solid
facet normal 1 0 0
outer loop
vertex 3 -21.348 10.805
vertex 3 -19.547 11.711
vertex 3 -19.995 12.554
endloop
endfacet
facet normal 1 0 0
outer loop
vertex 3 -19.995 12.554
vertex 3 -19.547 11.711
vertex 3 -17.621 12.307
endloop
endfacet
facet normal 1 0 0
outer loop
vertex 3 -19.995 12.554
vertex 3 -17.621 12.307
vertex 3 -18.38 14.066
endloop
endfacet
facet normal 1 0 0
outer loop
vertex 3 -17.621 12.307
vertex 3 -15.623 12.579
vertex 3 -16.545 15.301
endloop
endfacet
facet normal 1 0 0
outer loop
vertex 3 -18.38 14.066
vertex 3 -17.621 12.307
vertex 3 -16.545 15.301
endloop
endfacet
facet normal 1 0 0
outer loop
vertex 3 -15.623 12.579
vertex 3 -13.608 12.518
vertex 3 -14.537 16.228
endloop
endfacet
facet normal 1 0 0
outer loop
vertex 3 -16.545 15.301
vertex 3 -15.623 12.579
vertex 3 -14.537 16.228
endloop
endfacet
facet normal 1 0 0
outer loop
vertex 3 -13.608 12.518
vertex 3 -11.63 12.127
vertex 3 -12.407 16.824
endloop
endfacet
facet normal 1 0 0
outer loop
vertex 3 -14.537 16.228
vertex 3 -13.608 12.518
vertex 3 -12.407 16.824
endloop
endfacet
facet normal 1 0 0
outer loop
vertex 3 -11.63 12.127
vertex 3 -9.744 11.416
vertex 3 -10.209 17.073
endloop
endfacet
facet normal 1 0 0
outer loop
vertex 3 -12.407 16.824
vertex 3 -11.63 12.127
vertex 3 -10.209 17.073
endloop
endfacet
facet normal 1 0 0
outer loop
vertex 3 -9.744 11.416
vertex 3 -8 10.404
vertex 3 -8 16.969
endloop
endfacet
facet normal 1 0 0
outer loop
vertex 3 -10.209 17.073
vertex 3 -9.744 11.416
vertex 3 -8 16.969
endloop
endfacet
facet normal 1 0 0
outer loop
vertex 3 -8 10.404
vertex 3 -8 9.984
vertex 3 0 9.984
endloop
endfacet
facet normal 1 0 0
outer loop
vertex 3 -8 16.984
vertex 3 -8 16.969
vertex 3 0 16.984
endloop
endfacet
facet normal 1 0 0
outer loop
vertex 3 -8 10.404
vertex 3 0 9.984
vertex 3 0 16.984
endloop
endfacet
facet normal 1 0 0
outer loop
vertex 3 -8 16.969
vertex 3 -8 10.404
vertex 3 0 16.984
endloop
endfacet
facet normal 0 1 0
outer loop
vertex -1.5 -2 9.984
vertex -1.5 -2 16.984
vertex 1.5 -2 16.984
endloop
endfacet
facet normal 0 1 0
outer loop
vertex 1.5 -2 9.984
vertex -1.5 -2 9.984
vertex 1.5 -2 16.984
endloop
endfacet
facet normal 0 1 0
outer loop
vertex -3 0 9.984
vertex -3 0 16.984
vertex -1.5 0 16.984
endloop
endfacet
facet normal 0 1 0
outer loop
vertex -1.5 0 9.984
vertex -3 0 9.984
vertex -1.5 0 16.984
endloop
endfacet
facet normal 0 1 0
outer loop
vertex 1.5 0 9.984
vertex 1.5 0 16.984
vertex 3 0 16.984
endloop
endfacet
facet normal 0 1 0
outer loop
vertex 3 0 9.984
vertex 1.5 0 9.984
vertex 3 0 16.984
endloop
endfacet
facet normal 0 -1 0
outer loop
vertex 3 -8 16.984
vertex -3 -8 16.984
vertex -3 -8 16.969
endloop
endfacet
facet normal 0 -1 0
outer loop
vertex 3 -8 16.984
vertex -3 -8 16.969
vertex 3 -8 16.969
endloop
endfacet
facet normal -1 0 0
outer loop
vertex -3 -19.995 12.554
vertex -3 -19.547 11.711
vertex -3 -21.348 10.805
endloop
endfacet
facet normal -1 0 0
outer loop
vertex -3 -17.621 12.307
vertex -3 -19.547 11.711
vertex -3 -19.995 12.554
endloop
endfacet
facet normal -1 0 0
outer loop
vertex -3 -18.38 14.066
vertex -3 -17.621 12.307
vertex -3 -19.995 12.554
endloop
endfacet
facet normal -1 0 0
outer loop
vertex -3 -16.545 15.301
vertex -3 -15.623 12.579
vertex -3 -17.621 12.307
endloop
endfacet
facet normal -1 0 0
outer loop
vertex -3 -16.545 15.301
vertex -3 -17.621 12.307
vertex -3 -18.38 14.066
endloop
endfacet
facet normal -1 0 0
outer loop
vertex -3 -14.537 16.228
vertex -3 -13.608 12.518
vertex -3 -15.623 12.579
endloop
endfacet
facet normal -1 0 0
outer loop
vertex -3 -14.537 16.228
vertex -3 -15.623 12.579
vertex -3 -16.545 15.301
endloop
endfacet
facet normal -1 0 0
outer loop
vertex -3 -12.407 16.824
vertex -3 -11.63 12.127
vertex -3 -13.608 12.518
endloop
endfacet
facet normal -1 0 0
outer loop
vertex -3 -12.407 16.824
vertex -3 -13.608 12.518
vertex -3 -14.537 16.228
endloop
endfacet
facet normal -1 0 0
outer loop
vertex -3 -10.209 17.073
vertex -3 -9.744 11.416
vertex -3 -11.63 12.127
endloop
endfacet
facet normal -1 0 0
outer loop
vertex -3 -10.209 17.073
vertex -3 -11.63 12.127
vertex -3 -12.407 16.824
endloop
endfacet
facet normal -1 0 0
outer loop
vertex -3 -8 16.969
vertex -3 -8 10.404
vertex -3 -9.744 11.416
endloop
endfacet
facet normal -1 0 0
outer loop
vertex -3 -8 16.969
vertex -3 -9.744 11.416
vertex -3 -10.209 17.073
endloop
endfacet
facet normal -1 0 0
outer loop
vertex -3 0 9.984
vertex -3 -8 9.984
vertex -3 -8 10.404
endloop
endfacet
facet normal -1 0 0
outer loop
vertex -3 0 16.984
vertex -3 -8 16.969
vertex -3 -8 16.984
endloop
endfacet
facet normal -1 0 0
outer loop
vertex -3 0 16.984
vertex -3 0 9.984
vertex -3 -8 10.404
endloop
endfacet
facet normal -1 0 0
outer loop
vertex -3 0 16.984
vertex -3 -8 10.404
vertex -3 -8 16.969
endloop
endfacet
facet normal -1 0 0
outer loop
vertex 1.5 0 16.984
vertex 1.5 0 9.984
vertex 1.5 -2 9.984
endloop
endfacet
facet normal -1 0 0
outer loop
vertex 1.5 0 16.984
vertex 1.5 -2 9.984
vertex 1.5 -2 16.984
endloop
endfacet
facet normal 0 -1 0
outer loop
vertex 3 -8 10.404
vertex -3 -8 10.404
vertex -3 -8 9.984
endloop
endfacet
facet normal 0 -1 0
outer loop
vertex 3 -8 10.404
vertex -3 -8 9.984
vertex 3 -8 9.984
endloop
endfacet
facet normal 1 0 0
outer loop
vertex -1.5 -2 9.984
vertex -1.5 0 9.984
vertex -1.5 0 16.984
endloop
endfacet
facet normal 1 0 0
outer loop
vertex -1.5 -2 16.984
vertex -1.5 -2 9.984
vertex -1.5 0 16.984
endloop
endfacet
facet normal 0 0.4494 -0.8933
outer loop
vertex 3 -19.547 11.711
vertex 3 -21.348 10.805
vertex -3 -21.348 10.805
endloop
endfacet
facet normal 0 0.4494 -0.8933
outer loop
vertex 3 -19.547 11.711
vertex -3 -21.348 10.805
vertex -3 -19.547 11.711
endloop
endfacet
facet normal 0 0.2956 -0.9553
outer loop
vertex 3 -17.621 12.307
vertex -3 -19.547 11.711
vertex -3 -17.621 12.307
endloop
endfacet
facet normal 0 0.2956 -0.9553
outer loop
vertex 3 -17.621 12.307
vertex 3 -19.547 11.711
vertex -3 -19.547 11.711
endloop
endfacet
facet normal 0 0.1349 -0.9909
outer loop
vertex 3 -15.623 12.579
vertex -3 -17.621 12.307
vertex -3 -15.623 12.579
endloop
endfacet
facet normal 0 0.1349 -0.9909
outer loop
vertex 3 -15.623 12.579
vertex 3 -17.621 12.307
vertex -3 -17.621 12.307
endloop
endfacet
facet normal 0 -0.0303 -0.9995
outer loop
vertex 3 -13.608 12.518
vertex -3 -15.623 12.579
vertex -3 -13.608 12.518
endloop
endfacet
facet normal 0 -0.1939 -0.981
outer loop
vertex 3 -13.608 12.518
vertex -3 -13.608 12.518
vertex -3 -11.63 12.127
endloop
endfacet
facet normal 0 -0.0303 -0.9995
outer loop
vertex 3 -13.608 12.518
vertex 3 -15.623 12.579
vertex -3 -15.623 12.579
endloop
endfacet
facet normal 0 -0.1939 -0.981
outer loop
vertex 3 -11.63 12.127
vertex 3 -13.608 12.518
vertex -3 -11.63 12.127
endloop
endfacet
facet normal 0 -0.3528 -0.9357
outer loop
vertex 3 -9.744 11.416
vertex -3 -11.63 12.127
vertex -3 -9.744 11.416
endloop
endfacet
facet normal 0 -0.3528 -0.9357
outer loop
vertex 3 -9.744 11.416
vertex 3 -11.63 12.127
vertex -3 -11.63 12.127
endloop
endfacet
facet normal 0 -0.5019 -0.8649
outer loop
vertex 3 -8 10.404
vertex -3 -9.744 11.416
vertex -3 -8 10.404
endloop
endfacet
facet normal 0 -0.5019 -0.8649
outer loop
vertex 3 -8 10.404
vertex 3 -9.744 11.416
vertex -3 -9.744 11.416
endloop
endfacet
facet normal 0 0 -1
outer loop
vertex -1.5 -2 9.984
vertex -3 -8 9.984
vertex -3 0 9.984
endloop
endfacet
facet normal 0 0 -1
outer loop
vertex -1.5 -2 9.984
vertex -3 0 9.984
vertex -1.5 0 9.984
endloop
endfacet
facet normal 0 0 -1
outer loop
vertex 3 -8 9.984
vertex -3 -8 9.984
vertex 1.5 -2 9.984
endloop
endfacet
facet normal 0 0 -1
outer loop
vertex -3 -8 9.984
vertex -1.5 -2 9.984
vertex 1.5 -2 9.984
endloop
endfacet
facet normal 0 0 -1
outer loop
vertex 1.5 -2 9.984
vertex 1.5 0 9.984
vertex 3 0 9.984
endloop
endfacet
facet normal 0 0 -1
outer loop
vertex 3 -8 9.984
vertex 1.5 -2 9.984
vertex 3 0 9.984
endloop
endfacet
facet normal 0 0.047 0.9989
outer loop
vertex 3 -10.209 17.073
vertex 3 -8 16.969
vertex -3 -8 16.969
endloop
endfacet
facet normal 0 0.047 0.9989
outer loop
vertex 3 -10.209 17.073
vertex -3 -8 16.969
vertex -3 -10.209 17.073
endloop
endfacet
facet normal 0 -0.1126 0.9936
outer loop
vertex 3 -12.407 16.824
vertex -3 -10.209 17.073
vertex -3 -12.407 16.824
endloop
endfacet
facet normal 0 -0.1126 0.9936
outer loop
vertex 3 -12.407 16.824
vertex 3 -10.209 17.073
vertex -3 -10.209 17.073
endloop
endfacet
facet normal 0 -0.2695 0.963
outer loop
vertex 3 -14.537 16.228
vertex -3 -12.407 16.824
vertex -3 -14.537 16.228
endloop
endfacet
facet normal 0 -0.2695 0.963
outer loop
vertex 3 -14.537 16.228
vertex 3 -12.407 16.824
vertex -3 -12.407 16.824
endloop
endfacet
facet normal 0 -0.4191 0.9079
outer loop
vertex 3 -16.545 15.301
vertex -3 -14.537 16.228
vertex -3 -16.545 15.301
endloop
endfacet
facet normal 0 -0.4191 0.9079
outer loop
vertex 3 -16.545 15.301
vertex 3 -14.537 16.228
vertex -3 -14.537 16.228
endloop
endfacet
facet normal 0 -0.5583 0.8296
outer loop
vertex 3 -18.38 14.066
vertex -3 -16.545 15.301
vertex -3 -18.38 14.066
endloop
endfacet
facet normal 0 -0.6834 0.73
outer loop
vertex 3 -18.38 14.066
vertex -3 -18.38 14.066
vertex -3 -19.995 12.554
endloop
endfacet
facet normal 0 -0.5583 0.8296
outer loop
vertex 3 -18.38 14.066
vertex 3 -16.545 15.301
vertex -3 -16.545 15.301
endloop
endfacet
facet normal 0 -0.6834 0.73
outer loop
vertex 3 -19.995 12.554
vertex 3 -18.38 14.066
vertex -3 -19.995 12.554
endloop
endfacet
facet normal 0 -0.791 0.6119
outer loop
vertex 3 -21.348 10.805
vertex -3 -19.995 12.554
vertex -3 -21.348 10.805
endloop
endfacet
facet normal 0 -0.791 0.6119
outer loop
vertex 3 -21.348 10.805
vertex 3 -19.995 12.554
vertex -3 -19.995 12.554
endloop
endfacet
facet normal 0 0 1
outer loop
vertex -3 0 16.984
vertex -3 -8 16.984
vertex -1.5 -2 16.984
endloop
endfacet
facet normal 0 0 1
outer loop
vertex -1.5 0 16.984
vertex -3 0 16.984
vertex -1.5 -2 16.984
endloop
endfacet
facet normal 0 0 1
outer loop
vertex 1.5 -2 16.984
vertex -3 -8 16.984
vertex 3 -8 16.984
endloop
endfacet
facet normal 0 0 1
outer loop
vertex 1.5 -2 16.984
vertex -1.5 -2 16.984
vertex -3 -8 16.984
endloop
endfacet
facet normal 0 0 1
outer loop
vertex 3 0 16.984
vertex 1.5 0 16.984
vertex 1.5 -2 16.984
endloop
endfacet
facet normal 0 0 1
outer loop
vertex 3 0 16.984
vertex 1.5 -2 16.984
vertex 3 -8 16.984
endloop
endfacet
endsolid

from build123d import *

# Parameters (mm, degrees)
F0_W     = 6
F0_H     = 7
F1_DEPTH = 8
F2_W     = 3
F2_H     = 7.5
F3_DEPTH = 2
F5_DEPTH = 3


with BuildPart() as f1:
    # F0 (on Front) → F1 (new body)
    with BuildSketch(Plane.XZ):
        with Locations((0, 13.483554)):
            Rectangle(F0_W, F0_H)
    extrude(amount=F1_DEPTH)

    # F2 (on Front) → F3 (cut)
    with BuildSketch(Plane.XZ):
        with Locations((0, 13.472562)):
            Rectangle(F2_W, F2_H)
    extrude(amount=F3_DEPTH, mode=Mode.SUBTRACT)

    # F4 (on Right) → F5 (join, symmetric)
    with BuildSketch(Plane.YZ):
        with BuildLine():
            Line((-7.866293, 10.309412), (-6.651026, 16.728764))
            ThreePointArc((-6.651026, 16.728764), (-14.93047, 16.076312), (-21.348331, 10.805075))
            ThreePointArc((-21.348331, 10.805075), (-14.532663, 12.587694), (-7.866293, 10.309412))
        make_face()
    extrude(amount=F5_DEPTH, both=True)


solid = f1.part
